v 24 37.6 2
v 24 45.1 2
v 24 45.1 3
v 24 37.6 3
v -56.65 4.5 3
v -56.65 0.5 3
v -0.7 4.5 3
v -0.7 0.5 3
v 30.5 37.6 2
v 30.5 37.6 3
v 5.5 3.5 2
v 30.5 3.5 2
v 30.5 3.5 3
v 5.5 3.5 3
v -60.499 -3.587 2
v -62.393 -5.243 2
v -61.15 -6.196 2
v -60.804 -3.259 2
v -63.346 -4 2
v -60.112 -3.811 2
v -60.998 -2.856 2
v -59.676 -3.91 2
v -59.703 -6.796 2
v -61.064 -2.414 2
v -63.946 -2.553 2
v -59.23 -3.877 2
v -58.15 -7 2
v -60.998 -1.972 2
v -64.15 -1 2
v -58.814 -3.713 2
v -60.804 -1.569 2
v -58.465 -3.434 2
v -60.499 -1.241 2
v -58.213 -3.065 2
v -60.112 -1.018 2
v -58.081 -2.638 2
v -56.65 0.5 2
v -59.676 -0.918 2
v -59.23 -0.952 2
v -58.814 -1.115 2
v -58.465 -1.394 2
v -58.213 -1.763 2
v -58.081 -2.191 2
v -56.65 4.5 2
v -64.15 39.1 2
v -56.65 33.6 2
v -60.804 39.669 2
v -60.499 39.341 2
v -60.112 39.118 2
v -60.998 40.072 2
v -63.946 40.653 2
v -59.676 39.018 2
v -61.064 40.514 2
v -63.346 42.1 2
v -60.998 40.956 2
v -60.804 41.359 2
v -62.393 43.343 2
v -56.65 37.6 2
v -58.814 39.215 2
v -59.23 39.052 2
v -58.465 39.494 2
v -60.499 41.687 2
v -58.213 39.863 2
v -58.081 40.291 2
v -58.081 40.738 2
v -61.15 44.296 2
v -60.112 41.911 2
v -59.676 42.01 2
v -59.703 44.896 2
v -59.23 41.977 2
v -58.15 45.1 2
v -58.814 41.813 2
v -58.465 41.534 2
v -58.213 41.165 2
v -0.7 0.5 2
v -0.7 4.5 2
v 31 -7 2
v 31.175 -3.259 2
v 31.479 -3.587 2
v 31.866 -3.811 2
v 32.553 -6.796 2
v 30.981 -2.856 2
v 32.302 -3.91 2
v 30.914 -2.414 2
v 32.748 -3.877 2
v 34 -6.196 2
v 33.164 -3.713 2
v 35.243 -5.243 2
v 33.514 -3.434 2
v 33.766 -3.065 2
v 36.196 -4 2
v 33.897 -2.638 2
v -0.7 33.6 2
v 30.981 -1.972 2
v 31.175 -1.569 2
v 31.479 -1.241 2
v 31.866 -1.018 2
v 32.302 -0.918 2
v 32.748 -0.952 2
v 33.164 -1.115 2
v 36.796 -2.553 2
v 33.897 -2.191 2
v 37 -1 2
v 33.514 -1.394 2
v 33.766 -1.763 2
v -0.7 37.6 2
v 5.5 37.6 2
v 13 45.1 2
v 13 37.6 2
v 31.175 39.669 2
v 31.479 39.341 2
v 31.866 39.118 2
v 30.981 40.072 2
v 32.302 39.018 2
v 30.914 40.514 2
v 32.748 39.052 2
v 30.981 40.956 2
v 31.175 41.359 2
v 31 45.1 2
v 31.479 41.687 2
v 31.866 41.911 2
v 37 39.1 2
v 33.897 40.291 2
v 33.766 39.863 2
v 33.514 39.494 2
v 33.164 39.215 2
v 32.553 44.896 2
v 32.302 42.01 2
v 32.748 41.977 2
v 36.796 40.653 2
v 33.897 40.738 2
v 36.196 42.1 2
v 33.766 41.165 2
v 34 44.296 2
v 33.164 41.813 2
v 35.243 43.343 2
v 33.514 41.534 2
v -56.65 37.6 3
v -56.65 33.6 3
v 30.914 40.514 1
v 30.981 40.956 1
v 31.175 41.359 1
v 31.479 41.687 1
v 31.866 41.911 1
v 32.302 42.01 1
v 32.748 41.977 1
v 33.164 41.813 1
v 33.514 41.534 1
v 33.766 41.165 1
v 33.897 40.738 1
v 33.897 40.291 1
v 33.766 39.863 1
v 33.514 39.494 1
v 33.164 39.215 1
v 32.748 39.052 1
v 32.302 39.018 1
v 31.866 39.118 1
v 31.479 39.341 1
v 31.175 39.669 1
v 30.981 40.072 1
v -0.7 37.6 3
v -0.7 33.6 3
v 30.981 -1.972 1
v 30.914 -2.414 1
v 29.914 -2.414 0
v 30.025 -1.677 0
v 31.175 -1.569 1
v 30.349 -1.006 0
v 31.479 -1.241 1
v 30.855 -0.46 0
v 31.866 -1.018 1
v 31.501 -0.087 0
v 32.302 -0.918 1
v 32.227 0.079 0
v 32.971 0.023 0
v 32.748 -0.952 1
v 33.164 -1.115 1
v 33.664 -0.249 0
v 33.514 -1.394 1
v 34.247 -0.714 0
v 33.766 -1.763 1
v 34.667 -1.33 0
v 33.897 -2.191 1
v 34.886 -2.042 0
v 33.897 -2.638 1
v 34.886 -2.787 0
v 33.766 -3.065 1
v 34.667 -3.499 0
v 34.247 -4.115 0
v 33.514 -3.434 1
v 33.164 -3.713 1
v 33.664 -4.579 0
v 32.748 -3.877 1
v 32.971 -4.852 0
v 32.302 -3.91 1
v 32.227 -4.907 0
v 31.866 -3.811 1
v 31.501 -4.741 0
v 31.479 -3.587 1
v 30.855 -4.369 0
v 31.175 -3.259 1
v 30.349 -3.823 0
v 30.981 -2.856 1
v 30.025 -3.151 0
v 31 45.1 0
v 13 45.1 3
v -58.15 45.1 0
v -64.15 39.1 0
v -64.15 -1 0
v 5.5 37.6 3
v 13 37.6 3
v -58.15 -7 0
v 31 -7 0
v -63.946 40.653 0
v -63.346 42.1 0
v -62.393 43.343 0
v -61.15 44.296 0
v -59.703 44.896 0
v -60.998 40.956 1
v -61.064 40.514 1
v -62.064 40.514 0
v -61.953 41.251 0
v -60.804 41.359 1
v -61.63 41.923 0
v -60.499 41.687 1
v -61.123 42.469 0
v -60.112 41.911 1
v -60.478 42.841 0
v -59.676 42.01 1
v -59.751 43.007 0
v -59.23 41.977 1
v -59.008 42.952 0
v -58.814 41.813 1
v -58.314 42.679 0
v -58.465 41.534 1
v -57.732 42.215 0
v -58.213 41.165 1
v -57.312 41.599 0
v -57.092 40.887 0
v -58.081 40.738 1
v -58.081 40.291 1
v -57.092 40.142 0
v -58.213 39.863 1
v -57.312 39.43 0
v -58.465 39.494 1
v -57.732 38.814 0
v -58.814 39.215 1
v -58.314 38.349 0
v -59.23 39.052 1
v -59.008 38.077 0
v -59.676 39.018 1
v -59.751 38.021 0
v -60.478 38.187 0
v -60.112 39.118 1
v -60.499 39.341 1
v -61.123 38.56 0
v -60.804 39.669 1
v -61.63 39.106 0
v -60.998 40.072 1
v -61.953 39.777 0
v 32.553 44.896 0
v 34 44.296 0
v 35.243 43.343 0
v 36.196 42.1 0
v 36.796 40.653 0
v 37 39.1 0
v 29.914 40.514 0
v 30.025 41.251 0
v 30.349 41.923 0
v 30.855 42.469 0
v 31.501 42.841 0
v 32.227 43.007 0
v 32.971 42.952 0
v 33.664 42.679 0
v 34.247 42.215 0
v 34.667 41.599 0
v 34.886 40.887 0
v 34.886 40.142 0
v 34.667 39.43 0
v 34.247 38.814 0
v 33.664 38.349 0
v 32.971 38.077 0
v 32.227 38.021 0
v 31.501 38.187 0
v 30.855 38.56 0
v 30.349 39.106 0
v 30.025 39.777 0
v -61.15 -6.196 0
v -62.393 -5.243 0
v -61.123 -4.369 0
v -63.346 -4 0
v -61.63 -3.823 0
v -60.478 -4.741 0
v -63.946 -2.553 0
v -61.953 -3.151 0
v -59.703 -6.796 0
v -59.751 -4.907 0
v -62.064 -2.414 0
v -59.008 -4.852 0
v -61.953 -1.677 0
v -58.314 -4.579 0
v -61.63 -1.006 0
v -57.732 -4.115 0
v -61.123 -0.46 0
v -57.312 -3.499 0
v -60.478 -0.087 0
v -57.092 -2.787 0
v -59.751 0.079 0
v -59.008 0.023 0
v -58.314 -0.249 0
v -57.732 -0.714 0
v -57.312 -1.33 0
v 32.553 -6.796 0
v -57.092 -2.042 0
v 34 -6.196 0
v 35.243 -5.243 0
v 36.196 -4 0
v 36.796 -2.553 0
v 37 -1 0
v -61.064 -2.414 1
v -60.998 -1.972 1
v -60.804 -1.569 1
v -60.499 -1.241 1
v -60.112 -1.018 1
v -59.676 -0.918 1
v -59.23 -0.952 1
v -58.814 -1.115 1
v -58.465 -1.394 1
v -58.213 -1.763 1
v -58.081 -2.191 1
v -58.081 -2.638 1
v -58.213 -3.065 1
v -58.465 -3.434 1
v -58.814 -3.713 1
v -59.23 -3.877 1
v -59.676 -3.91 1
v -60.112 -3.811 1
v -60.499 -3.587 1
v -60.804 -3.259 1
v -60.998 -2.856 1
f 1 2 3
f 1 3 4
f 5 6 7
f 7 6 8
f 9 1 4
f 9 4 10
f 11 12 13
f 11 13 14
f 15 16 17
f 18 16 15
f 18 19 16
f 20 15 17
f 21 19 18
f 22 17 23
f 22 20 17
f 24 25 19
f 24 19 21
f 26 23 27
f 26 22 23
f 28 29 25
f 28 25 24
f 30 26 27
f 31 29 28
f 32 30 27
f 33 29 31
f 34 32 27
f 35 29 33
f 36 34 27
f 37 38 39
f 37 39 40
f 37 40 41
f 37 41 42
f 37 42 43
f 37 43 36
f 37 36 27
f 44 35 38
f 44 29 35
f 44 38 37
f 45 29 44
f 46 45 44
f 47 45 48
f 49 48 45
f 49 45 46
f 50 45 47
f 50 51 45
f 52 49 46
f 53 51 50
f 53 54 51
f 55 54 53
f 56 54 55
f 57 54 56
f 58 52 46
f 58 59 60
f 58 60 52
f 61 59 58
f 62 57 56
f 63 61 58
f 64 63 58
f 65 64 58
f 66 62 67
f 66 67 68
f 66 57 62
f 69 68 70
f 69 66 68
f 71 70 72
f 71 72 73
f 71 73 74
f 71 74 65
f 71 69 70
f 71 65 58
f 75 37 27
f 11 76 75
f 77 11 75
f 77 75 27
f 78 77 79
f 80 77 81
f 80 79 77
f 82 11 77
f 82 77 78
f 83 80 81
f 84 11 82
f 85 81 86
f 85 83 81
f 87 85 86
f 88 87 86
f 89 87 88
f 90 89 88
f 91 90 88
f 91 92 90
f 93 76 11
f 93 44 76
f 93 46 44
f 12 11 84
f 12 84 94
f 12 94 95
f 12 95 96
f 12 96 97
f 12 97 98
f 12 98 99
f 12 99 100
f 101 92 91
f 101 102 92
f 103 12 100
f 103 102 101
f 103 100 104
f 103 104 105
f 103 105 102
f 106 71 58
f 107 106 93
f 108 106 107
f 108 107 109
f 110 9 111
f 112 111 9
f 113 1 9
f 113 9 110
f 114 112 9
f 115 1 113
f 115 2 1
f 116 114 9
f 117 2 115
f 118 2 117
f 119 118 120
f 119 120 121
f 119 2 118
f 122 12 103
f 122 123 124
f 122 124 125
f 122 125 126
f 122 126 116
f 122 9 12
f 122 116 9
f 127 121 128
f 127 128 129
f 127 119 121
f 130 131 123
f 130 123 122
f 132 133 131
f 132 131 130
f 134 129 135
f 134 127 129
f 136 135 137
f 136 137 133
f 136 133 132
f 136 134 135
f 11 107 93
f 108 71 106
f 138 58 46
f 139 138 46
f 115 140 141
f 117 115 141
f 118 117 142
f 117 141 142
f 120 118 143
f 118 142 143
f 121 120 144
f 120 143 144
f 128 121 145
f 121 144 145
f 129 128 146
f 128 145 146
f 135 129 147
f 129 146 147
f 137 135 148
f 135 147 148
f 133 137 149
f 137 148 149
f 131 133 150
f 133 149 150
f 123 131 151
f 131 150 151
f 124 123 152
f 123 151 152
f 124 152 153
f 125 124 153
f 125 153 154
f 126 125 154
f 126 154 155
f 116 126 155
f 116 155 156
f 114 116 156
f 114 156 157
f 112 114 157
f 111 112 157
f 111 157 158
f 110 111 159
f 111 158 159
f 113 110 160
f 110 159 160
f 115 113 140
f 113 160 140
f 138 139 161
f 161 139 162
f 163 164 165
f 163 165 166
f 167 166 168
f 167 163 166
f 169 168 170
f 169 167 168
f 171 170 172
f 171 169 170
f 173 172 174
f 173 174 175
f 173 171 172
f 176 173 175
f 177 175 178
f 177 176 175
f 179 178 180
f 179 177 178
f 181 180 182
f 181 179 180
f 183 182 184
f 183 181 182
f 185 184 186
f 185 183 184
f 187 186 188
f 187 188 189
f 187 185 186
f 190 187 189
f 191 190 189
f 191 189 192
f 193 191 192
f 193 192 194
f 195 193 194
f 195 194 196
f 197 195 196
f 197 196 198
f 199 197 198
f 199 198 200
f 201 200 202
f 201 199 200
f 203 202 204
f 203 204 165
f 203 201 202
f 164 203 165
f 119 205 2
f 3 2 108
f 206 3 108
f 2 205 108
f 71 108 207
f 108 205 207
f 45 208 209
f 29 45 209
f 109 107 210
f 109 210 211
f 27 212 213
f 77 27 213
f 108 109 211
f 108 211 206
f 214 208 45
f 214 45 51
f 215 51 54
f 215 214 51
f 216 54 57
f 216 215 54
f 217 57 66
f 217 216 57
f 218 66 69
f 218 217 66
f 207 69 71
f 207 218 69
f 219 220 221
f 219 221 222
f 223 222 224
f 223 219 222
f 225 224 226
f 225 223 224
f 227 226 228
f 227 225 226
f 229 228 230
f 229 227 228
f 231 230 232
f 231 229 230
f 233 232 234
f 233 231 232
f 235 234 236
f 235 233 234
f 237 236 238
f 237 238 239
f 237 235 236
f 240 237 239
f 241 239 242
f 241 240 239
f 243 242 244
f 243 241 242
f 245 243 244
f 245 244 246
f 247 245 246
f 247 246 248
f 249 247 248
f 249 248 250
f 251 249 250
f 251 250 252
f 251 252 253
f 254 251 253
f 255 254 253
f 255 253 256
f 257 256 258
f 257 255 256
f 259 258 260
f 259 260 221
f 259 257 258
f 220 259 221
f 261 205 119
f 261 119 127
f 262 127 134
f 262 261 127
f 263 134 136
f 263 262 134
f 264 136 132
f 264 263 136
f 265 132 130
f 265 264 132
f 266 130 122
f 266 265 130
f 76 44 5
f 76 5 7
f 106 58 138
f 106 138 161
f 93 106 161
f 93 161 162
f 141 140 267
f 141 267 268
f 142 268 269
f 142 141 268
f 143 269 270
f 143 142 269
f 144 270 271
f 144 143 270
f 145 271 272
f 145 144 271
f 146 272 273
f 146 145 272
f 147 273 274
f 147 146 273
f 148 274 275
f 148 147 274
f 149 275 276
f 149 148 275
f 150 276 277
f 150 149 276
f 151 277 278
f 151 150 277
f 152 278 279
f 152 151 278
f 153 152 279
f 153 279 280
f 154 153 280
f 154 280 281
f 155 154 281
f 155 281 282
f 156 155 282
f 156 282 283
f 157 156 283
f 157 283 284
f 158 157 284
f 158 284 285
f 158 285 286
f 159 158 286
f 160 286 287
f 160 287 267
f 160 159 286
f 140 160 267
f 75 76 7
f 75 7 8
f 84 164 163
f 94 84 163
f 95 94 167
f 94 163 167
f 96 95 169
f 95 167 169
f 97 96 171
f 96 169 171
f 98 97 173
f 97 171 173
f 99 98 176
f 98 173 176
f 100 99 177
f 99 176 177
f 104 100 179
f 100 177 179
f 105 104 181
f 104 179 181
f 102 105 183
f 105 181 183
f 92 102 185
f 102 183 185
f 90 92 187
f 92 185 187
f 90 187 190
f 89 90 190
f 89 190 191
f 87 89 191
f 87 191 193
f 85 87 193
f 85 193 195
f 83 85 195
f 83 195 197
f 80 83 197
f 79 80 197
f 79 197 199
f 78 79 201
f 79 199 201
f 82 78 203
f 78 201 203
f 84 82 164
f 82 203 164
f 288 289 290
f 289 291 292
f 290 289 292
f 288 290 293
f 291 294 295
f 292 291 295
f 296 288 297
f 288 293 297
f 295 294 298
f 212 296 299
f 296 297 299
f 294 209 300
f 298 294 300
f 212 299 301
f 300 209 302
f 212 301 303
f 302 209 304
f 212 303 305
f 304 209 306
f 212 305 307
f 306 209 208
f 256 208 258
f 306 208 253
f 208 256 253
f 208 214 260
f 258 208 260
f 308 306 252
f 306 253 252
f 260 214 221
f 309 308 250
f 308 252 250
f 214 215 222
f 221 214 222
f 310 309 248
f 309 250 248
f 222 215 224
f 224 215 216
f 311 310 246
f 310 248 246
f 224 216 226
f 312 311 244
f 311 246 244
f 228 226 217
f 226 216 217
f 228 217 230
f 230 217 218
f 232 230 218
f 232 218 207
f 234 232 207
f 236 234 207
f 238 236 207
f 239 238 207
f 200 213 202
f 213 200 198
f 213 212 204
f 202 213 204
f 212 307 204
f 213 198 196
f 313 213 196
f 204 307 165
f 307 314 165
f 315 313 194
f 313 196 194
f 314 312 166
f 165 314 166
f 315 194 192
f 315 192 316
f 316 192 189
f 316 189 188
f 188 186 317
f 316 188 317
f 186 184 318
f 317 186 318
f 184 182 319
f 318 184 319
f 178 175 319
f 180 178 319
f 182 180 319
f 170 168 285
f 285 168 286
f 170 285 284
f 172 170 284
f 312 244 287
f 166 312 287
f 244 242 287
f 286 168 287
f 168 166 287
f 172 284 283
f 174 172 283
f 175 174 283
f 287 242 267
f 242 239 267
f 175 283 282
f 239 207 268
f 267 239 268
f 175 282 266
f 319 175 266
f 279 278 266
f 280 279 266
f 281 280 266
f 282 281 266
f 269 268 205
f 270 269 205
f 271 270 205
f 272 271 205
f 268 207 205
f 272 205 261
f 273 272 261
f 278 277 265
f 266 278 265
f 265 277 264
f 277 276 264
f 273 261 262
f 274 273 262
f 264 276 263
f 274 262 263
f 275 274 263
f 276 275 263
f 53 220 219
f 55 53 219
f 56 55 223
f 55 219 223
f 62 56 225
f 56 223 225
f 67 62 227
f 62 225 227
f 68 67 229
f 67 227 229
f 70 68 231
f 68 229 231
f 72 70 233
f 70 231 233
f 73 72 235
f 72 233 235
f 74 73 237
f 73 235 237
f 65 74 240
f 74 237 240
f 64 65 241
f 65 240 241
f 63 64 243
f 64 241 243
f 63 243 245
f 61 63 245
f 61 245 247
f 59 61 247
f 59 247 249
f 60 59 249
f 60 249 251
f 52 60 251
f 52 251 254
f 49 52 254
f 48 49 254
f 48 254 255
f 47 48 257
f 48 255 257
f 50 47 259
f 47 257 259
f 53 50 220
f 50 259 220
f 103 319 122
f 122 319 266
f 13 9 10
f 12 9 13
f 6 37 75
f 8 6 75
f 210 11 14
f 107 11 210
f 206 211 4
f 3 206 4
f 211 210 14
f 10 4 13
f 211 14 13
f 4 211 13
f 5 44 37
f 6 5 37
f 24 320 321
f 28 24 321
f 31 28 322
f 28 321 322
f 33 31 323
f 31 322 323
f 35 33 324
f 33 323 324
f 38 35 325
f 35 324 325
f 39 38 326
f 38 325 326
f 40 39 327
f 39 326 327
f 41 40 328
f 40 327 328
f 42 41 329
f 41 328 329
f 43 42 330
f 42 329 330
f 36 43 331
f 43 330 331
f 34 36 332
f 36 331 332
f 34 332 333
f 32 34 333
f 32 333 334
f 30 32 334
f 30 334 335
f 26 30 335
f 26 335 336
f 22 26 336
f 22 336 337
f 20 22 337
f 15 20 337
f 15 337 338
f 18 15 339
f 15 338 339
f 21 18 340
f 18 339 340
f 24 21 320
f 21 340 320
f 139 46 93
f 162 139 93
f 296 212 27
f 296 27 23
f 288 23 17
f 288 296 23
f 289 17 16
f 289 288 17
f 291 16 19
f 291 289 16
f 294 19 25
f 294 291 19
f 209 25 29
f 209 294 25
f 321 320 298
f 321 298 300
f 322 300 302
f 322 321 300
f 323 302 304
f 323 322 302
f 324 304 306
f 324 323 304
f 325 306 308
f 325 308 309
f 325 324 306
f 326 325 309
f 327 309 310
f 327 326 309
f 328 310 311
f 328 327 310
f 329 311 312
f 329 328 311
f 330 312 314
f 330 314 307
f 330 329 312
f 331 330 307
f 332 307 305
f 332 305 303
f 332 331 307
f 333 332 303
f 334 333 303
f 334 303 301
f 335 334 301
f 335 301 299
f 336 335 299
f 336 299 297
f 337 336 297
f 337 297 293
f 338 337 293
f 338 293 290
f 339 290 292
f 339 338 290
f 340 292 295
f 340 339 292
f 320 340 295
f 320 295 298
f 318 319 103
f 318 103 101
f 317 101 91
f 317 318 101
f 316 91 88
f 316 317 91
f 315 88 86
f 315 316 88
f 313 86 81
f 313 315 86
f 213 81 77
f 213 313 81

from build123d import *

# Parameters (mm, degrees)
SKETCH019_R     = 1.5
PAD009_DEPTH    = 2
SKETCH020_W     = 55.95
SKETCH020_H     = 4
PAD010_DEPTH    = 1
CHAMFER002_SIZE = 1


with BuildPart() as esp_macropad_bottom:
    # Sketch019 → Pad009 (new body)
    with BuildSketch(Plane(origin=(0, 0, 0), x_dir=(-1, 0, 0), z_dir=(0, 0, -1))):
        with BuildLine():
            Line((-31, 45.1), (58.15, 45.1))
            ThreePointArc((64.15, 39.1), (62.392641, 43.342641), (58.15, 45.1))
            Line((64.15, 39.1), (64.15, -1.000024))
            ThreePointArc((58.15, -7), (62.392639, -5.242656), (64.15, -1.000024))
            Line((58.15, -7), (-31, -7))
            ThreePointArc((-37, -1), (-35.242641, -5.242641), (-31, -7))
            Line((-37, -1), (-37, 39.1))
            ThreePointArc((-31, 45.1), (-35.242641, 43.342641), (-37, 39.1))
        make_face()
        with Locations((-32.414214, 40.514214)):
            Circle(SKETCH019_R, mode=Mode.SUBTRACT)
        with Locations((59.564214, 40.514214)):
            Circle(SKETCH019_R, mode=Mode.SUBTRACT)
        with Locations((59.564214, -2.414214)):
            Circle(SKETCH019_R, mode=Mode.SUBTRACT)
        with Locations((-32.414214, -2.414214)):
            Circle(SKETCH019_R, mode=Mode.SUBTRACT)
    extrude(amount=PAD009_DEPTH)

    # Sketch020 (on Face14 of Pad009) → Pad010 (join)
    with BuildSketch(Plane(origin=(0, 0, -2), x_dir=(1, 0, 0), z_dir=(0, 0, -1))):
        with Locations((-28.675, -2.5)):
            Rectangle(SKETCH020_W, SKETCH020_H)
        with Locations((-28.675, -35.6)):
            Rectangle(SKETCH020_W, SKETCH020_H)
        Polygon((5.5, -33.6), (5.5, -37.6), (13, -37.6), (13, -45.1), (24, -45.1), (24, -37.6), (30.5, -37.6), (30.5, -33.6), (30.5, -4.5), (30.5, -3.5), (5.5, -3.5), (5.5, -4.5), align=None)
    extrude(amount=PAD010_DEPTH)

    # Chamfer002
    chamfer002_edges = [esp_macropad_bottom.edges().sort_by_distance(p)[0] for p in [
        (-58.064214, -2.414214, 0),
        (-58.064214, 40.514214, 0),
        (33.914214, 40.514214, 0),
        (33.914214, -2.414214, 0),
    ]]
    chamfer(chamfer002_edges, length=CHAMFER002_SIZE)


with BuildPart() as part_mirroring:
    # Part__Mirroring: instance of ESP-Macropad-Bottom
    add(esp_macropad_bottom.part.mirror(Plane(origin=(0, 0, 0), x_dir=(0, 1, 0), z_dir=(0, 0, 1))))


solid = part_mirroring.part
